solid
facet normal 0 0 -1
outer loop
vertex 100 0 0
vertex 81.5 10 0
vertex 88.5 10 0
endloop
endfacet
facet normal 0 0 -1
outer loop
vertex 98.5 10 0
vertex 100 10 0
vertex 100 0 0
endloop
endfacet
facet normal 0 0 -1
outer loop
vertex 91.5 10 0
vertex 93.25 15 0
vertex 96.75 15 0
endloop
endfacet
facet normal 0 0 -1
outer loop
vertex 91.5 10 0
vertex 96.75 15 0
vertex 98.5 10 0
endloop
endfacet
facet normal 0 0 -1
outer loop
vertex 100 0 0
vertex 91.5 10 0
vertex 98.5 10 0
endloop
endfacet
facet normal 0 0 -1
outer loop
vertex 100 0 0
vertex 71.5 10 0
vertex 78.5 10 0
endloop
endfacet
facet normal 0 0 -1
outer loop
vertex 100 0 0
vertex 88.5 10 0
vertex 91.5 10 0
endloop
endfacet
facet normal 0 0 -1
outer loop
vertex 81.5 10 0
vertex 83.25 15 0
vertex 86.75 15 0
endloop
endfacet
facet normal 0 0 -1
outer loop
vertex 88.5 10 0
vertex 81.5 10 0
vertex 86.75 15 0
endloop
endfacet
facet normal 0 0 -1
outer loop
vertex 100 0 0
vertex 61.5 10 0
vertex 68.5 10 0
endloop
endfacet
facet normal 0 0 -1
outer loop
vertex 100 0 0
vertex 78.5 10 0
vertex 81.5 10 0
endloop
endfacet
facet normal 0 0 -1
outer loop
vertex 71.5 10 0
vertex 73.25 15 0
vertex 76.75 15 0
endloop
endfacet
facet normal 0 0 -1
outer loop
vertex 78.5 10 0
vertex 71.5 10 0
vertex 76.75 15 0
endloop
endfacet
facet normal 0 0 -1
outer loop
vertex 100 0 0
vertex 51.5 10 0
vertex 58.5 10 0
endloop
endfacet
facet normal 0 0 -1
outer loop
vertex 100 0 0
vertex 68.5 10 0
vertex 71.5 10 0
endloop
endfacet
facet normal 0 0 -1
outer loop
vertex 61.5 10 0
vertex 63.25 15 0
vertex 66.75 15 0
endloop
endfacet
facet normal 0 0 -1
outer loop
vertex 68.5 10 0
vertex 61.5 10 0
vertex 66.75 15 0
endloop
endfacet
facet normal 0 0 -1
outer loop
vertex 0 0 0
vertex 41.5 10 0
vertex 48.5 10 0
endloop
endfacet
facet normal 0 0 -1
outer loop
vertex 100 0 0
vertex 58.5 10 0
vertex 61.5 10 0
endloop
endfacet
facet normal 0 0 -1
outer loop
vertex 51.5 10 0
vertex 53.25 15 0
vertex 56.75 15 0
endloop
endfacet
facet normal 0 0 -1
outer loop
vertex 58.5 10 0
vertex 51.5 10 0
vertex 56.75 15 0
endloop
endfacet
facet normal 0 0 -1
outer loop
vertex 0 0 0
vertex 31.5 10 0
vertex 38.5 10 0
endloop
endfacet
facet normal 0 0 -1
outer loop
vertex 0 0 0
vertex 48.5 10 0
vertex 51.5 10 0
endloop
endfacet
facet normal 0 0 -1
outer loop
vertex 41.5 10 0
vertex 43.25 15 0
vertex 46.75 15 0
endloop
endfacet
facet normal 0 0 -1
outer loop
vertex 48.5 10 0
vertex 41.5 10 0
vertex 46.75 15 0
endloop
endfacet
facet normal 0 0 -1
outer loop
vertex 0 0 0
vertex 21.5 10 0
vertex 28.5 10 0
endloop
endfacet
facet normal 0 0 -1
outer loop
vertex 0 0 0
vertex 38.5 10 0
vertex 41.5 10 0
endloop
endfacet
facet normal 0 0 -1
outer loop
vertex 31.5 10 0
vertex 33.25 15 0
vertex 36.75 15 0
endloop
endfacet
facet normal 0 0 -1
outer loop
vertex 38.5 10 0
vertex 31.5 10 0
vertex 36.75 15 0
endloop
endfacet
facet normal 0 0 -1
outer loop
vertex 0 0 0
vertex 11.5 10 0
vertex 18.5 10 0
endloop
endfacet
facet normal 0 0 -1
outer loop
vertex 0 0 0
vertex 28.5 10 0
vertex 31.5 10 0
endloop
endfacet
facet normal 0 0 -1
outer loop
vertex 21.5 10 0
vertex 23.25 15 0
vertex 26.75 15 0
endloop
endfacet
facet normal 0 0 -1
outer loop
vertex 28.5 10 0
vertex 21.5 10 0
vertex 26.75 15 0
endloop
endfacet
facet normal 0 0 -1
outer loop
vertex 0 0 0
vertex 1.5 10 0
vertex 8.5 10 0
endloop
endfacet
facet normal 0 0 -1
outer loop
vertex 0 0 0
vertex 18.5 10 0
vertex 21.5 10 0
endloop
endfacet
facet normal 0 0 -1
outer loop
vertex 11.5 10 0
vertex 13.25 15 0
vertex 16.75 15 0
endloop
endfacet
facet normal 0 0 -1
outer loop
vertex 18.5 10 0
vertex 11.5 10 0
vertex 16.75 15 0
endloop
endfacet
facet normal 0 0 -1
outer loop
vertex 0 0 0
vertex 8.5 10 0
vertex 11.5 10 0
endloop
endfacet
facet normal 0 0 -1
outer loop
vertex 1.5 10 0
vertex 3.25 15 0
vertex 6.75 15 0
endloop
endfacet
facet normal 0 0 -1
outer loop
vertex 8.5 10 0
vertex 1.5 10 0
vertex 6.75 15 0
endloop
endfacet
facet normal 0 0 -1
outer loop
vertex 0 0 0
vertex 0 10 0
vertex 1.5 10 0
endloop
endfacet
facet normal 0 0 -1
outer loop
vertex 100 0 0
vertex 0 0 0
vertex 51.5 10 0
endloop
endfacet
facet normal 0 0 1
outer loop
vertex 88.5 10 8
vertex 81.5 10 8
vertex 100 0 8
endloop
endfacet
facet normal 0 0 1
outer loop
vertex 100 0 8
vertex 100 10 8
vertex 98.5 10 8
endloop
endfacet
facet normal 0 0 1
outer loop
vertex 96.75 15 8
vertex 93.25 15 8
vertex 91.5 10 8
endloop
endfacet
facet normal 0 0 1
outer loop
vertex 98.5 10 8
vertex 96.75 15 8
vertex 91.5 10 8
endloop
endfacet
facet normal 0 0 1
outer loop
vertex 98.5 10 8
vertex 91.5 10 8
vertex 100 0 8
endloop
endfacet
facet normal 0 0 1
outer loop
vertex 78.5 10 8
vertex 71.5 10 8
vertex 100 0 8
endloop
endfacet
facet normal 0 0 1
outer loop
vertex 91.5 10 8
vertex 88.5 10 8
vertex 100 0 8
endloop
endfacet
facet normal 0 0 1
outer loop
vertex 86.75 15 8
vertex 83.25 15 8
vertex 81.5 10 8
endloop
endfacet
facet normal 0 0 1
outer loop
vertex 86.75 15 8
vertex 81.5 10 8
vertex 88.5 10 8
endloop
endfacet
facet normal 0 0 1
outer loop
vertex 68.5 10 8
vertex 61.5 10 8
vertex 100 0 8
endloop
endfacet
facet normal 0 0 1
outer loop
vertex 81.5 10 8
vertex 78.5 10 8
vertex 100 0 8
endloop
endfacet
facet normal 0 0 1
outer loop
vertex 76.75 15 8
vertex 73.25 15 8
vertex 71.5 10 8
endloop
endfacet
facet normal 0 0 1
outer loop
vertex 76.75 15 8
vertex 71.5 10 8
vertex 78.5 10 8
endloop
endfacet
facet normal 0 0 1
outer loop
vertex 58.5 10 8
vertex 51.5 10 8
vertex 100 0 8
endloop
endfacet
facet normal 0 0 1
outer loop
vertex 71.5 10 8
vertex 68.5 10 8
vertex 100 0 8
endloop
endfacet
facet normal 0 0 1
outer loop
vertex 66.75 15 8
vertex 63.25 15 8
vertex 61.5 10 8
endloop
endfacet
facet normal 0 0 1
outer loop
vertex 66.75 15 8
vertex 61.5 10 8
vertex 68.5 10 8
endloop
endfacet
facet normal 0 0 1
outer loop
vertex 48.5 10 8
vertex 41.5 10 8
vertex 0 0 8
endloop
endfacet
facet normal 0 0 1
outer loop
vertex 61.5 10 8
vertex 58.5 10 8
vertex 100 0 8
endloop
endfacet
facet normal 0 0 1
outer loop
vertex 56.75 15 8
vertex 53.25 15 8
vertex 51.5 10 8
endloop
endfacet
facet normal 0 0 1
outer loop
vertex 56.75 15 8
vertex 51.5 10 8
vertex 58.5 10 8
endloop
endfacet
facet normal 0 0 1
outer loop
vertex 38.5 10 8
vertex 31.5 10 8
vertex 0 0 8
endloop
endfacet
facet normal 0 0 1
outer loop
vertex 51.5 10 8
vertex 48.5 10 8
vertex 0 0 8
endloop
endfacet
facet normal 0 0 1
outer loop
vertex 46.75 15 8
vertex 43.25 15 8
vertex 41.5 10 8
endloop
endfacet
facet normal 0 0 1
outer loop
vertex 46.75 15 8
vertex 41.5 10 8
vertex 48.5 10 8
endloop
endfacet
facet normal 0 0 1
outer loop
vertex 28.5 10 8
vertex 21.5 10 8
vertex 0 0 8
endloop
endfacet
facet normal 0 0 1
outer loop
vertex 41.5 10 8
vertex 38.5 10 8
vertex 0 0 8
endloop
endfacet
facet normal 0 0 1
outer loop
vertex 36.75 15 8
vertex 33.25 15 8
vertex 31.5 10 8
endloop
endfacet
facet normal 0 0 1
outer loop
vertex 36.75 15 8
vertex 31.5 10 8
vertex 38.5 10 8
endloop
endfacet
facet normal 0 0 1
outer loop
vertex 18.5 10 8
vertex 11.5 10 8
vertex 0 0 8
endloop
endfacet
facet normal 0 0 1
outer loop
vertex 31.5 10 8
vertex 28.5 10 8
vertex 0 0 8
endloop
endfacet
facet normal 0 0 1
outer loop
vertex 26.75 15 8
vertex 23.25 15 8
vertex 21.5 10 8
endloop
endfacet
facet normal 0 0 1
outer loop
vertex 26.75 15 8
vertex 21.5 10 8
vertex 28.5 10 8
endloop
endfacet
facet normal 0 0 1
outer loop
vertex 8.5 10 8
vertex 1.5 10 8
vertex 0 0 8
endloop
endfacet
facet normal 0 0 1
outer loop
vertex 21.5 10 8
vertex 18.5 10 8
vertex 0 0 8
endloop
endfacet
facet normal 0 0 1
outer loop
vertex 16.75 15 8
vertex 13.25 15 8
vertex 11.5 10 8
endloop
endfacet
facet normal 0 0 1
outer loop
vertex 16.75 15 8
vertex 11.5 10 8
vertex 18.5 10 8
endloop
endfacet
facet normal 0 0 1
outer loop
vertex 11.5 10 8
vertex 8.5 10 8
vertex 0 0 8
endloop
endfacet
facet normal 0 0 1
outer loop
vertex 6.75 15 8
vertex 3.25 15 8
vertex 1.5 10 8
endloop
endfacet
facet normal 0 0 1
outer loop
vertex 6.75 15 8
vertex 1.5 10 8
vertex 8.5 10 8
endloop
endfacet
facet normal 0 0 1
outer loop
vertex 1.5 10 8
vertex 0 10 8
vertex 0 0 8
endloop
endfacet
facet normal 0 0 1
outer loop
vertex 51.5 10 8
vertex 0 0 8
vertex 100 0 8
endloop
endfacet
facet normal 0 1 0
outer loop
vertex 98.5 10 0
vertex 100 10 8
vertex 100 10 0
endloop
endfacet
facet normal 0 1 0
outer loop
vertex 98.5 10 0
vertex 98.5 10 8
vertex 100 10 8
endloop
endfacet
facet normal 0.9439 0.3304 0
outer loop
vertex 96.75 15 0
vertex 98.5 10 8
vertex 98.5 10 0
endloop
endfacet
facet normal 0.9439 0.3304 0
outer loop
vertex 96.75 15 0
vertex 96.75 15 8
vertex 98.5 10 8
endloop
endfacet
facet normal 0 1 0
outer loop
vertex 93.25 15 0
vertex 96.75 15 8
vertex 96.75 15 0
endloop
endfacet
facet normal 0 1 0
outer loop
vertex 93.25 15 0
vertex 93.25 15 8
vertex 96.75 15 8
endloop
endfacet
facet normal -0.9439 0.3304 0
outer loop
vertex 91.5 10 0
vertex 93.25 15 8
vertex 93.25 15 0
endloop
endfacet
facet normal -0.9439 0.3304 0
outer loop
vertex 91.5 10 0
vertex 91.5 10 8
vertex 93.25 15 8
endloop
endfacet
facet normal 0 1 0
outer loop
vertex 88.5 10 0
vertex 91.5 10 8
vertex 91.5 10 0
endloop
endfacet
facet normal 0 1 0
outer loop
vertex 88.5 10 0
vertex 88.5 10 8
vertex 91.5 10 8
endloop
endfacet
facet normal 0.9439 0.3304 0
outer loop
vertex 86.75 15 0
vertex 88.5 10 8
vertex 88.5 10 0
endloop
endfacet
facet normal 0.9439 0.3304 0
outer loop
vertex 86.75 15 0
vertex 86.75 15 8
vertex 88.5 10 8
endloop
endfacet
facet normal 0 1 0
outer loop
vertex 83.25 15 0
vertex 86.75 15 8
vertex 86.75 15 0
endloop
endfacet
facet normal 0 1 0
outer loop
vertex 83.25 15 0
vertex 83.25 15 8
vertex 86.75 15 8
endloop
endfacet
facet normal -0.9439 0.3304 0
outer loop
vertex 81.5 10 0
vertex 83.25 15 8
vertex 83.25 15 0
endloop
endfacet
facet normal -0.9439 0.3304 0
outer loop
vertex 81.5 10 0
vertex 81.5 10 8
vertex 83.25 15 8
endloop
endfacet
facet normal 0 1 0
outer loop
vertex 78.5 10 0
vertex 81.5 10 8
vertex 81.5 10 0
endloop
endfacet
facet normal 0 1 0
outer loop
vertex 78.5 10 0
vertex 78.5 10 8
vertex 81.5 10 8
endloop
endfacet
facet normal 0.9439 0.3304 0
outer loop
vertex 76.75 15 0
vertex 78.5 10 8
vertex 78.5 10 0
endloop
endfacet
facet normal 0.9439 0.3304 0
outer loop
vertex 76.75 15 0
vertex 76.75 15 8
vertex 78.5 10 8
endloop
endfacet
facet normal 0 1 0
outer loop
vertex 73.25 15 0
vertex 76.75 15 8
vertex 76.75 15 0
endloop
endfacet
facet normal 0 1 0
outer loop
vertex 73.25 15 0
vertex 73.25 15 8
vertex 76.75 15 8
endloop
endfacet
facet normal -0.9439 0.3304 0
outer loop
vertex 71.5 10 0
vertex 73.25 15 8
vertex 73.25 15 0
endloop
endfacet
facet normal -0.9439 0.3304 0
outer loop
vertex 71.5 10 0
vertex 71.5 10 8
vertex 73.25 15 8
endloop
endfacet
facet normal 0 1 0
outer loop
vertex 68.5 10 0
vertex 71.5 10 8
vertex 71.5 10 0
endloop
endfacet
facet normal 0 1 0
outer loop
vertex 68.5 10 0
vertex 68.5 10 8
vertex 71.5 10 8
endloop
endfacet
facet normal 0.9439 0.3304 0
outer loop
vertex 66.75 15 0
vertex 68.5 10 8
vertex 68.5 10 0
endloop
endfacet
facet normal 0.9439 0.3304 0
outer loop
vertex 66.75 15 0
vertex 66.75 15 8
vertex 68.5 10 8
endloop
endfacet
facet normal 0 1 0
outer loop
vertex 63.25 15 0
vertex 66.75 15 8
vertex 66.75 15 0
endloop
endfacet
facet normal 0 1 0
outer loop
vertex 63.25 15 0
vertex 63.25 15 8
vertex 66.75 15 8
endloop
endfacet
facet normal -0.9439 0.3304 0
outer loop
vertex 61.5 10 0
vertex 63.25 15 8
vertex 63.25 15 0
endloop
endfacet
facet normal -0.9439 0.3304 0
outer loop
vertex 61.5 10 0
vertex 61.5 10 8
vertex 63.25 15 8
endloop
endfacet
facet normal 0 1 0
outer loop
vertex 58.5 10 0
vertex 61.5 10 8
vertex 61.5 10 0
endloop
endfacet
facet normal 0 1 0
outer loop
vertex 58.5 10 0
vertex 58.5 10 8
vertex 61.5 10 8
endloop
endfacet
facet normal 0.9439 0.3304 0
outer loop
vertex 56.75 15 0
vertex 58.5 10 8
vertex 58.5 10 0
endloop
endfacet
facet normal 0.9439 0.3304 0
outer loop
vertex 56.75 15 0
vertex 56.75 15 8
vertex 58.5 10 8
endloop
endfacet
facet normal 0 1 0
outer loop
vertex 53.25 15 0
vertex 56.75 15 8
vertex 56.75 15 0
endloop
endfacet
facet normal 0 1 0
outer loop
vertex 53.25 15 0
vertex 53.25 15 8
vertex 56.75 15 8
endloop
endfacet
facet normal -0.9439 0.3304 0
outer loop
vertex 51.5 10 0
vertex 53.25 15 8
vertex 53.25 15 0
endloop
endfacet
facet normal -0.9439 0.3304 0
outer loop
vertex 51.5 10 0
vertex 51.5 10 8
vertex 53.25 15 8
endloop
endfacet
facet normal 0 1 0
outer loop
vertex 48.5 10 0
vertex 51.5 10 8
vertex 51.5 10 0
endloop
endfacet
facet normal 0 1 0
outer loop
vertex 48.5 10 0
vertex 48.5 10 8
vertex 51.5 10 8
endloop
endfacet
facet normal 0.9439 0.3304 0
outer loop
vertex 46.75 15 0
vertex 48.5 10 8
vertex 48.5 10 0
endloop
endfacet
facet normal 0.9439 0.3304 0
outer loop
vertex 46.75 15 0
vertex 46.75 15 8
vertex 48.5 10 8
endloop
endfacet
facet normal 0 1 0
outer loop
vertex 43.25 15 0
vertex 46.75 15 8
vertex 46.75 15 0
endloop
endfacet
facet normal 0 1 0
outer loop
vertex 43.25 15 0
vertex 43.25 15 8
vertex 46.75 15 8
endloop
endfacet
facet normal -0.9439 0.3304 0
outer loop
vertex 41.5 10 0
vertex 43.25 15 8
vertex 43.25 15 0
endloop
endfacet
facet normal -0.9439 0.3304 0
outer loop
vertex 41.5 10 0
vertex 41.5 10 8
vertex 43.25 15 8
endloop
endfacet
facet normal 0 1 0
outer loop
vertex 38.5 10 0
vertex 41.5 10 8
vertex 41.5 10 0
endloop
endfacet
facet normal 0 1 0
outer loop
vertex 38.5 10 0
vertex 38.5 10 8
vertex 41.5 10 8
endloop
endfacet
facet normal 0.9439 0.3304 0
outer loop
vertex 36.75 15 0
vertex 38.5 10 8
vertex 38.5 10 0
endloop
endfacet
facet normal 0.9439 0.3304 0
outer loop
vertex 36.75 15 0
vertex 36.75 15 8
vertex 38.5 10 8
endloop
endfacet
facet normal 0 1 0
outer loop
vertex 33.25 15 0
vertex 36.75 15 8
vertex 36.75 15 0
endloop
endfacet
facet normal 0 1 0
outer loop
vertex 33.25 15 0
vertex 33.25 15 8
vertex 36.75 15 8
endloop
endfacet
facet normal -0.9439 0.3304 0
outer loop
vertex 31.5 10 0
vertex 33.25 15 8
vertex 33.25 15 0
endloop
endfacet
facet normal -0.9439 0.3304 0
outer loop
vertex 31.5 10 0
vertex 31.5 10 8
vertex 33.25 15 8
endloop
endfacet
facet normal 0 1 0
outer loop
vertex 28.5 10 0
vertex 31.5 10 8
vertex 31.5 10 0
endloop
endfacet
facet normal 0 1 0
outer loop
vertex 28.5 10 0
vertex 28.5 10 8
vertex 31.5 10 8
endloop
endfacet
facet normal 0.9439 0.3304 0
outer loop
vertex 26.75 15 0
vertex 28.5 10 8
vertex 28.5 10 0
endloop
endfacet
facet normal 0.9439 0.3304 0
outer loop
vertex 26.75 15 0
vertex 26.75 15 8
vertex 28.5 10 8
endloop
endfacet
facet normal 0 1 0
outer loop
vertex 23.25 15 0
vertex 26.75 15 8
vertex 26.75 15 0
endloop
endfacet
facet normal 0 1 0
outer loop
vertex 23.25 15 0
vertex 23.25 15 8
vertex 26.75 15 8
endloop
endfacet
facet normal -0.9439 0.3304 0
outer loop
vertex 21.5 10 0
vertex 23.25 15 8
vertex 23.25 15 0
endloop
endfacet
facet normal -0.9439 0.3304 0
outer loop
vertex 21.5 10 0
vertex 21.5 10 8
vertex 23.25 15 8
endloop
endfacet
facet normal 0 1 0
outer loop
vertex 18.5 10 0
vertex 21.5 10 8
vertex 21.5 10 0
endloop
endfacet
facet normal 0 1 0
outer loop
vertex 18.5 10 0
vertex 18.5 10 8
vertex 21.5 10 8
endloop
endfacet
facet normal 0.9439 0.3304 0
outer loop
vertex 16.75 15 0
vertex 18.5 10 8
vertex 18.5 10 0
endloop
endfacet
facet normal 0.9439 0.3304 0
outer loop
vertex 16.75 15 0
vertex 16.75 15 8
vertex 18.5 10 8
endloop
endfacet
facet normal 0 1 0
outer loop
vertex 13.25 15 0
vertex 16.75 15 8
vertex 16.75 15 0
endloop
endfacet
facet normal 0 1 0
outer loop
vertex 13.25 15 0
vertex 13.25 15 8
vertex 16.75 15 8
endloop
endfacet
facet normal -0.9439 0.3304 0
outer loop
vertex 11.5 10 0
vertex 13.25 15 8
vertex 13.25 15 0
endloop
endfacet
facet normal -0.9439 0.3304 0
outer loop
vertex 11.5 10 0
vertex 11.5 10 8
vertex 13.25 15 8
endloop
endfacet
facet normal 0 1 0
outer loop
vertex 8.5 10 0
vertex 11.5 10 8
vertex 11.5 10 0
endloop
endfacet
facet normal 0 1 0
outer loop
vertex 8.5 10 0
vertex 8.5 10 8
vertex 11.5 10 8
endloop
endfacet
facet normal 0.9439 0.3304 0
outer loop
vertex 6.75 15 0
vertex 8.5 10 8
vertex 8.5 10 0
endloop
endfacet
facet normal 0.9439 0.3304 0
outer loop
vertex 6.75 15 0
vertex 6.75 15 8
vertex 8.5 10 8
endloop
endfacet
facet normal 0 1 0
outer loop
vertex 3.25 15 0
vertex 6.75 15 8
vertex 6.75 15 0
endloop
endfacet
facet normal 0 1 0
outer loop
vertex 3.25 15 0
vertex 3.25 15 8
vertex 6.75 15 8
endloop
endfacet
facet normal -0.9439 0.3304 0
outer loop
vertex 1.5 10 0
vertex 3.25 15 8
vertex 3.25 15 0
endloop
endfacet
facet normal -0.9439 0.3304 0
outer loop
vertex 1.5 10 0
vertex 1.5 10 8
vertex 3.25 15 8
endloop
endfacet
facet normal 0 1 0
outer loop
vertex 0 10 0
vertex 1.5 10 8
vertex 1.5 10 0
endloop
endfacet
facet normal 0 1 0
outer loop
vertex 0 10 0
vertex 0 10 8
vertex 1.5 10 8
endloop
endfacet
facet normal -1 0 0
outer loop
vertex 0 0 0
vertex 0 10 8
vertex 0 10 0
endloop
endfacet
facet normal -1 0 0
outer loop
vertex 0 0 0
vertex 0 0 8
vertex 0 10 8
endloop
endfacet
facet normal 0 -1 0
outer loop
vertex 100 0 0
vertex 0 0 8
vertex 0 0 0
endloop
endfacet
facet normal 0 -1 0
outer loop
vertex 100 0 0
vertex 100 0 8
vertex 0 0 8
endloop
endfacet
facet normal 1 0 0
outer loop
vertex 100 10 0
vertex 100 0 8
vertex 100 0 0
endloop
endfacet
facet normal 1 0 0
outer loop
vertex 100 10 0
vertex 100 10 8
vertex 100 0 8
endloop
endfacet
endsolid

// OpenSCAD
$fn = 32;

// ----------------------------------------------------------------------
// Gear rack: 10 teeth, pitch 10 mm
// ----------------------------------------------------------------------

// --- parameters (mm) ---
teeth = 10;               // number of teeth
pitch = 10;               // tooth pitch, X
root_w = 7;               // tooth width at the root
tip_w = 3.5;              // tooth width at the tip
base_h = 10;              // rack body height, Y
tooth_h = 5;              // tooth height above the body
plate_t = 8;              // rack width, Z (extrusion height)

rack_l = teeth * pitch;  // overall length
total_h = base_h + tooth_h;  // overall height

profile = [[0, 0], [100, 0], [100, 10], [98.5, 10], [96.75, 15], [93.25, 15], [91.5, 10], [88.5, 10], [86.75, 15], [83.25, 15], [81.5, 10], [78.5, 10], [76.75, 15], [73.25, 15], [71.5, 10], [68.5, 10], [66.75, 15], [63.25, 15], [61.5, 10], [58.5, 10], [56.75, 15], [53.25, 15], [51.5, 10], [48.5, 10], [46.75, 15], [43.25, 15], [41.5, 10], [38.5, 10], [36.75, 15], [33.25, 15], [31.5, 10], [28.5, 10], [26.75, 15], [23.25, 15], [21.5, 10], [18.5, 10], [16.75, 15], [13.25, 15], [11.5, 10], [8.5, 10], [6.75, 15], [3.25, 15], [1.5, 10], [0, 10]];  // primary outline, 44 points, counter clockwise

// --- the one profile operation ---
linear_extrude(height = plate_t) polygon(points = profile);
